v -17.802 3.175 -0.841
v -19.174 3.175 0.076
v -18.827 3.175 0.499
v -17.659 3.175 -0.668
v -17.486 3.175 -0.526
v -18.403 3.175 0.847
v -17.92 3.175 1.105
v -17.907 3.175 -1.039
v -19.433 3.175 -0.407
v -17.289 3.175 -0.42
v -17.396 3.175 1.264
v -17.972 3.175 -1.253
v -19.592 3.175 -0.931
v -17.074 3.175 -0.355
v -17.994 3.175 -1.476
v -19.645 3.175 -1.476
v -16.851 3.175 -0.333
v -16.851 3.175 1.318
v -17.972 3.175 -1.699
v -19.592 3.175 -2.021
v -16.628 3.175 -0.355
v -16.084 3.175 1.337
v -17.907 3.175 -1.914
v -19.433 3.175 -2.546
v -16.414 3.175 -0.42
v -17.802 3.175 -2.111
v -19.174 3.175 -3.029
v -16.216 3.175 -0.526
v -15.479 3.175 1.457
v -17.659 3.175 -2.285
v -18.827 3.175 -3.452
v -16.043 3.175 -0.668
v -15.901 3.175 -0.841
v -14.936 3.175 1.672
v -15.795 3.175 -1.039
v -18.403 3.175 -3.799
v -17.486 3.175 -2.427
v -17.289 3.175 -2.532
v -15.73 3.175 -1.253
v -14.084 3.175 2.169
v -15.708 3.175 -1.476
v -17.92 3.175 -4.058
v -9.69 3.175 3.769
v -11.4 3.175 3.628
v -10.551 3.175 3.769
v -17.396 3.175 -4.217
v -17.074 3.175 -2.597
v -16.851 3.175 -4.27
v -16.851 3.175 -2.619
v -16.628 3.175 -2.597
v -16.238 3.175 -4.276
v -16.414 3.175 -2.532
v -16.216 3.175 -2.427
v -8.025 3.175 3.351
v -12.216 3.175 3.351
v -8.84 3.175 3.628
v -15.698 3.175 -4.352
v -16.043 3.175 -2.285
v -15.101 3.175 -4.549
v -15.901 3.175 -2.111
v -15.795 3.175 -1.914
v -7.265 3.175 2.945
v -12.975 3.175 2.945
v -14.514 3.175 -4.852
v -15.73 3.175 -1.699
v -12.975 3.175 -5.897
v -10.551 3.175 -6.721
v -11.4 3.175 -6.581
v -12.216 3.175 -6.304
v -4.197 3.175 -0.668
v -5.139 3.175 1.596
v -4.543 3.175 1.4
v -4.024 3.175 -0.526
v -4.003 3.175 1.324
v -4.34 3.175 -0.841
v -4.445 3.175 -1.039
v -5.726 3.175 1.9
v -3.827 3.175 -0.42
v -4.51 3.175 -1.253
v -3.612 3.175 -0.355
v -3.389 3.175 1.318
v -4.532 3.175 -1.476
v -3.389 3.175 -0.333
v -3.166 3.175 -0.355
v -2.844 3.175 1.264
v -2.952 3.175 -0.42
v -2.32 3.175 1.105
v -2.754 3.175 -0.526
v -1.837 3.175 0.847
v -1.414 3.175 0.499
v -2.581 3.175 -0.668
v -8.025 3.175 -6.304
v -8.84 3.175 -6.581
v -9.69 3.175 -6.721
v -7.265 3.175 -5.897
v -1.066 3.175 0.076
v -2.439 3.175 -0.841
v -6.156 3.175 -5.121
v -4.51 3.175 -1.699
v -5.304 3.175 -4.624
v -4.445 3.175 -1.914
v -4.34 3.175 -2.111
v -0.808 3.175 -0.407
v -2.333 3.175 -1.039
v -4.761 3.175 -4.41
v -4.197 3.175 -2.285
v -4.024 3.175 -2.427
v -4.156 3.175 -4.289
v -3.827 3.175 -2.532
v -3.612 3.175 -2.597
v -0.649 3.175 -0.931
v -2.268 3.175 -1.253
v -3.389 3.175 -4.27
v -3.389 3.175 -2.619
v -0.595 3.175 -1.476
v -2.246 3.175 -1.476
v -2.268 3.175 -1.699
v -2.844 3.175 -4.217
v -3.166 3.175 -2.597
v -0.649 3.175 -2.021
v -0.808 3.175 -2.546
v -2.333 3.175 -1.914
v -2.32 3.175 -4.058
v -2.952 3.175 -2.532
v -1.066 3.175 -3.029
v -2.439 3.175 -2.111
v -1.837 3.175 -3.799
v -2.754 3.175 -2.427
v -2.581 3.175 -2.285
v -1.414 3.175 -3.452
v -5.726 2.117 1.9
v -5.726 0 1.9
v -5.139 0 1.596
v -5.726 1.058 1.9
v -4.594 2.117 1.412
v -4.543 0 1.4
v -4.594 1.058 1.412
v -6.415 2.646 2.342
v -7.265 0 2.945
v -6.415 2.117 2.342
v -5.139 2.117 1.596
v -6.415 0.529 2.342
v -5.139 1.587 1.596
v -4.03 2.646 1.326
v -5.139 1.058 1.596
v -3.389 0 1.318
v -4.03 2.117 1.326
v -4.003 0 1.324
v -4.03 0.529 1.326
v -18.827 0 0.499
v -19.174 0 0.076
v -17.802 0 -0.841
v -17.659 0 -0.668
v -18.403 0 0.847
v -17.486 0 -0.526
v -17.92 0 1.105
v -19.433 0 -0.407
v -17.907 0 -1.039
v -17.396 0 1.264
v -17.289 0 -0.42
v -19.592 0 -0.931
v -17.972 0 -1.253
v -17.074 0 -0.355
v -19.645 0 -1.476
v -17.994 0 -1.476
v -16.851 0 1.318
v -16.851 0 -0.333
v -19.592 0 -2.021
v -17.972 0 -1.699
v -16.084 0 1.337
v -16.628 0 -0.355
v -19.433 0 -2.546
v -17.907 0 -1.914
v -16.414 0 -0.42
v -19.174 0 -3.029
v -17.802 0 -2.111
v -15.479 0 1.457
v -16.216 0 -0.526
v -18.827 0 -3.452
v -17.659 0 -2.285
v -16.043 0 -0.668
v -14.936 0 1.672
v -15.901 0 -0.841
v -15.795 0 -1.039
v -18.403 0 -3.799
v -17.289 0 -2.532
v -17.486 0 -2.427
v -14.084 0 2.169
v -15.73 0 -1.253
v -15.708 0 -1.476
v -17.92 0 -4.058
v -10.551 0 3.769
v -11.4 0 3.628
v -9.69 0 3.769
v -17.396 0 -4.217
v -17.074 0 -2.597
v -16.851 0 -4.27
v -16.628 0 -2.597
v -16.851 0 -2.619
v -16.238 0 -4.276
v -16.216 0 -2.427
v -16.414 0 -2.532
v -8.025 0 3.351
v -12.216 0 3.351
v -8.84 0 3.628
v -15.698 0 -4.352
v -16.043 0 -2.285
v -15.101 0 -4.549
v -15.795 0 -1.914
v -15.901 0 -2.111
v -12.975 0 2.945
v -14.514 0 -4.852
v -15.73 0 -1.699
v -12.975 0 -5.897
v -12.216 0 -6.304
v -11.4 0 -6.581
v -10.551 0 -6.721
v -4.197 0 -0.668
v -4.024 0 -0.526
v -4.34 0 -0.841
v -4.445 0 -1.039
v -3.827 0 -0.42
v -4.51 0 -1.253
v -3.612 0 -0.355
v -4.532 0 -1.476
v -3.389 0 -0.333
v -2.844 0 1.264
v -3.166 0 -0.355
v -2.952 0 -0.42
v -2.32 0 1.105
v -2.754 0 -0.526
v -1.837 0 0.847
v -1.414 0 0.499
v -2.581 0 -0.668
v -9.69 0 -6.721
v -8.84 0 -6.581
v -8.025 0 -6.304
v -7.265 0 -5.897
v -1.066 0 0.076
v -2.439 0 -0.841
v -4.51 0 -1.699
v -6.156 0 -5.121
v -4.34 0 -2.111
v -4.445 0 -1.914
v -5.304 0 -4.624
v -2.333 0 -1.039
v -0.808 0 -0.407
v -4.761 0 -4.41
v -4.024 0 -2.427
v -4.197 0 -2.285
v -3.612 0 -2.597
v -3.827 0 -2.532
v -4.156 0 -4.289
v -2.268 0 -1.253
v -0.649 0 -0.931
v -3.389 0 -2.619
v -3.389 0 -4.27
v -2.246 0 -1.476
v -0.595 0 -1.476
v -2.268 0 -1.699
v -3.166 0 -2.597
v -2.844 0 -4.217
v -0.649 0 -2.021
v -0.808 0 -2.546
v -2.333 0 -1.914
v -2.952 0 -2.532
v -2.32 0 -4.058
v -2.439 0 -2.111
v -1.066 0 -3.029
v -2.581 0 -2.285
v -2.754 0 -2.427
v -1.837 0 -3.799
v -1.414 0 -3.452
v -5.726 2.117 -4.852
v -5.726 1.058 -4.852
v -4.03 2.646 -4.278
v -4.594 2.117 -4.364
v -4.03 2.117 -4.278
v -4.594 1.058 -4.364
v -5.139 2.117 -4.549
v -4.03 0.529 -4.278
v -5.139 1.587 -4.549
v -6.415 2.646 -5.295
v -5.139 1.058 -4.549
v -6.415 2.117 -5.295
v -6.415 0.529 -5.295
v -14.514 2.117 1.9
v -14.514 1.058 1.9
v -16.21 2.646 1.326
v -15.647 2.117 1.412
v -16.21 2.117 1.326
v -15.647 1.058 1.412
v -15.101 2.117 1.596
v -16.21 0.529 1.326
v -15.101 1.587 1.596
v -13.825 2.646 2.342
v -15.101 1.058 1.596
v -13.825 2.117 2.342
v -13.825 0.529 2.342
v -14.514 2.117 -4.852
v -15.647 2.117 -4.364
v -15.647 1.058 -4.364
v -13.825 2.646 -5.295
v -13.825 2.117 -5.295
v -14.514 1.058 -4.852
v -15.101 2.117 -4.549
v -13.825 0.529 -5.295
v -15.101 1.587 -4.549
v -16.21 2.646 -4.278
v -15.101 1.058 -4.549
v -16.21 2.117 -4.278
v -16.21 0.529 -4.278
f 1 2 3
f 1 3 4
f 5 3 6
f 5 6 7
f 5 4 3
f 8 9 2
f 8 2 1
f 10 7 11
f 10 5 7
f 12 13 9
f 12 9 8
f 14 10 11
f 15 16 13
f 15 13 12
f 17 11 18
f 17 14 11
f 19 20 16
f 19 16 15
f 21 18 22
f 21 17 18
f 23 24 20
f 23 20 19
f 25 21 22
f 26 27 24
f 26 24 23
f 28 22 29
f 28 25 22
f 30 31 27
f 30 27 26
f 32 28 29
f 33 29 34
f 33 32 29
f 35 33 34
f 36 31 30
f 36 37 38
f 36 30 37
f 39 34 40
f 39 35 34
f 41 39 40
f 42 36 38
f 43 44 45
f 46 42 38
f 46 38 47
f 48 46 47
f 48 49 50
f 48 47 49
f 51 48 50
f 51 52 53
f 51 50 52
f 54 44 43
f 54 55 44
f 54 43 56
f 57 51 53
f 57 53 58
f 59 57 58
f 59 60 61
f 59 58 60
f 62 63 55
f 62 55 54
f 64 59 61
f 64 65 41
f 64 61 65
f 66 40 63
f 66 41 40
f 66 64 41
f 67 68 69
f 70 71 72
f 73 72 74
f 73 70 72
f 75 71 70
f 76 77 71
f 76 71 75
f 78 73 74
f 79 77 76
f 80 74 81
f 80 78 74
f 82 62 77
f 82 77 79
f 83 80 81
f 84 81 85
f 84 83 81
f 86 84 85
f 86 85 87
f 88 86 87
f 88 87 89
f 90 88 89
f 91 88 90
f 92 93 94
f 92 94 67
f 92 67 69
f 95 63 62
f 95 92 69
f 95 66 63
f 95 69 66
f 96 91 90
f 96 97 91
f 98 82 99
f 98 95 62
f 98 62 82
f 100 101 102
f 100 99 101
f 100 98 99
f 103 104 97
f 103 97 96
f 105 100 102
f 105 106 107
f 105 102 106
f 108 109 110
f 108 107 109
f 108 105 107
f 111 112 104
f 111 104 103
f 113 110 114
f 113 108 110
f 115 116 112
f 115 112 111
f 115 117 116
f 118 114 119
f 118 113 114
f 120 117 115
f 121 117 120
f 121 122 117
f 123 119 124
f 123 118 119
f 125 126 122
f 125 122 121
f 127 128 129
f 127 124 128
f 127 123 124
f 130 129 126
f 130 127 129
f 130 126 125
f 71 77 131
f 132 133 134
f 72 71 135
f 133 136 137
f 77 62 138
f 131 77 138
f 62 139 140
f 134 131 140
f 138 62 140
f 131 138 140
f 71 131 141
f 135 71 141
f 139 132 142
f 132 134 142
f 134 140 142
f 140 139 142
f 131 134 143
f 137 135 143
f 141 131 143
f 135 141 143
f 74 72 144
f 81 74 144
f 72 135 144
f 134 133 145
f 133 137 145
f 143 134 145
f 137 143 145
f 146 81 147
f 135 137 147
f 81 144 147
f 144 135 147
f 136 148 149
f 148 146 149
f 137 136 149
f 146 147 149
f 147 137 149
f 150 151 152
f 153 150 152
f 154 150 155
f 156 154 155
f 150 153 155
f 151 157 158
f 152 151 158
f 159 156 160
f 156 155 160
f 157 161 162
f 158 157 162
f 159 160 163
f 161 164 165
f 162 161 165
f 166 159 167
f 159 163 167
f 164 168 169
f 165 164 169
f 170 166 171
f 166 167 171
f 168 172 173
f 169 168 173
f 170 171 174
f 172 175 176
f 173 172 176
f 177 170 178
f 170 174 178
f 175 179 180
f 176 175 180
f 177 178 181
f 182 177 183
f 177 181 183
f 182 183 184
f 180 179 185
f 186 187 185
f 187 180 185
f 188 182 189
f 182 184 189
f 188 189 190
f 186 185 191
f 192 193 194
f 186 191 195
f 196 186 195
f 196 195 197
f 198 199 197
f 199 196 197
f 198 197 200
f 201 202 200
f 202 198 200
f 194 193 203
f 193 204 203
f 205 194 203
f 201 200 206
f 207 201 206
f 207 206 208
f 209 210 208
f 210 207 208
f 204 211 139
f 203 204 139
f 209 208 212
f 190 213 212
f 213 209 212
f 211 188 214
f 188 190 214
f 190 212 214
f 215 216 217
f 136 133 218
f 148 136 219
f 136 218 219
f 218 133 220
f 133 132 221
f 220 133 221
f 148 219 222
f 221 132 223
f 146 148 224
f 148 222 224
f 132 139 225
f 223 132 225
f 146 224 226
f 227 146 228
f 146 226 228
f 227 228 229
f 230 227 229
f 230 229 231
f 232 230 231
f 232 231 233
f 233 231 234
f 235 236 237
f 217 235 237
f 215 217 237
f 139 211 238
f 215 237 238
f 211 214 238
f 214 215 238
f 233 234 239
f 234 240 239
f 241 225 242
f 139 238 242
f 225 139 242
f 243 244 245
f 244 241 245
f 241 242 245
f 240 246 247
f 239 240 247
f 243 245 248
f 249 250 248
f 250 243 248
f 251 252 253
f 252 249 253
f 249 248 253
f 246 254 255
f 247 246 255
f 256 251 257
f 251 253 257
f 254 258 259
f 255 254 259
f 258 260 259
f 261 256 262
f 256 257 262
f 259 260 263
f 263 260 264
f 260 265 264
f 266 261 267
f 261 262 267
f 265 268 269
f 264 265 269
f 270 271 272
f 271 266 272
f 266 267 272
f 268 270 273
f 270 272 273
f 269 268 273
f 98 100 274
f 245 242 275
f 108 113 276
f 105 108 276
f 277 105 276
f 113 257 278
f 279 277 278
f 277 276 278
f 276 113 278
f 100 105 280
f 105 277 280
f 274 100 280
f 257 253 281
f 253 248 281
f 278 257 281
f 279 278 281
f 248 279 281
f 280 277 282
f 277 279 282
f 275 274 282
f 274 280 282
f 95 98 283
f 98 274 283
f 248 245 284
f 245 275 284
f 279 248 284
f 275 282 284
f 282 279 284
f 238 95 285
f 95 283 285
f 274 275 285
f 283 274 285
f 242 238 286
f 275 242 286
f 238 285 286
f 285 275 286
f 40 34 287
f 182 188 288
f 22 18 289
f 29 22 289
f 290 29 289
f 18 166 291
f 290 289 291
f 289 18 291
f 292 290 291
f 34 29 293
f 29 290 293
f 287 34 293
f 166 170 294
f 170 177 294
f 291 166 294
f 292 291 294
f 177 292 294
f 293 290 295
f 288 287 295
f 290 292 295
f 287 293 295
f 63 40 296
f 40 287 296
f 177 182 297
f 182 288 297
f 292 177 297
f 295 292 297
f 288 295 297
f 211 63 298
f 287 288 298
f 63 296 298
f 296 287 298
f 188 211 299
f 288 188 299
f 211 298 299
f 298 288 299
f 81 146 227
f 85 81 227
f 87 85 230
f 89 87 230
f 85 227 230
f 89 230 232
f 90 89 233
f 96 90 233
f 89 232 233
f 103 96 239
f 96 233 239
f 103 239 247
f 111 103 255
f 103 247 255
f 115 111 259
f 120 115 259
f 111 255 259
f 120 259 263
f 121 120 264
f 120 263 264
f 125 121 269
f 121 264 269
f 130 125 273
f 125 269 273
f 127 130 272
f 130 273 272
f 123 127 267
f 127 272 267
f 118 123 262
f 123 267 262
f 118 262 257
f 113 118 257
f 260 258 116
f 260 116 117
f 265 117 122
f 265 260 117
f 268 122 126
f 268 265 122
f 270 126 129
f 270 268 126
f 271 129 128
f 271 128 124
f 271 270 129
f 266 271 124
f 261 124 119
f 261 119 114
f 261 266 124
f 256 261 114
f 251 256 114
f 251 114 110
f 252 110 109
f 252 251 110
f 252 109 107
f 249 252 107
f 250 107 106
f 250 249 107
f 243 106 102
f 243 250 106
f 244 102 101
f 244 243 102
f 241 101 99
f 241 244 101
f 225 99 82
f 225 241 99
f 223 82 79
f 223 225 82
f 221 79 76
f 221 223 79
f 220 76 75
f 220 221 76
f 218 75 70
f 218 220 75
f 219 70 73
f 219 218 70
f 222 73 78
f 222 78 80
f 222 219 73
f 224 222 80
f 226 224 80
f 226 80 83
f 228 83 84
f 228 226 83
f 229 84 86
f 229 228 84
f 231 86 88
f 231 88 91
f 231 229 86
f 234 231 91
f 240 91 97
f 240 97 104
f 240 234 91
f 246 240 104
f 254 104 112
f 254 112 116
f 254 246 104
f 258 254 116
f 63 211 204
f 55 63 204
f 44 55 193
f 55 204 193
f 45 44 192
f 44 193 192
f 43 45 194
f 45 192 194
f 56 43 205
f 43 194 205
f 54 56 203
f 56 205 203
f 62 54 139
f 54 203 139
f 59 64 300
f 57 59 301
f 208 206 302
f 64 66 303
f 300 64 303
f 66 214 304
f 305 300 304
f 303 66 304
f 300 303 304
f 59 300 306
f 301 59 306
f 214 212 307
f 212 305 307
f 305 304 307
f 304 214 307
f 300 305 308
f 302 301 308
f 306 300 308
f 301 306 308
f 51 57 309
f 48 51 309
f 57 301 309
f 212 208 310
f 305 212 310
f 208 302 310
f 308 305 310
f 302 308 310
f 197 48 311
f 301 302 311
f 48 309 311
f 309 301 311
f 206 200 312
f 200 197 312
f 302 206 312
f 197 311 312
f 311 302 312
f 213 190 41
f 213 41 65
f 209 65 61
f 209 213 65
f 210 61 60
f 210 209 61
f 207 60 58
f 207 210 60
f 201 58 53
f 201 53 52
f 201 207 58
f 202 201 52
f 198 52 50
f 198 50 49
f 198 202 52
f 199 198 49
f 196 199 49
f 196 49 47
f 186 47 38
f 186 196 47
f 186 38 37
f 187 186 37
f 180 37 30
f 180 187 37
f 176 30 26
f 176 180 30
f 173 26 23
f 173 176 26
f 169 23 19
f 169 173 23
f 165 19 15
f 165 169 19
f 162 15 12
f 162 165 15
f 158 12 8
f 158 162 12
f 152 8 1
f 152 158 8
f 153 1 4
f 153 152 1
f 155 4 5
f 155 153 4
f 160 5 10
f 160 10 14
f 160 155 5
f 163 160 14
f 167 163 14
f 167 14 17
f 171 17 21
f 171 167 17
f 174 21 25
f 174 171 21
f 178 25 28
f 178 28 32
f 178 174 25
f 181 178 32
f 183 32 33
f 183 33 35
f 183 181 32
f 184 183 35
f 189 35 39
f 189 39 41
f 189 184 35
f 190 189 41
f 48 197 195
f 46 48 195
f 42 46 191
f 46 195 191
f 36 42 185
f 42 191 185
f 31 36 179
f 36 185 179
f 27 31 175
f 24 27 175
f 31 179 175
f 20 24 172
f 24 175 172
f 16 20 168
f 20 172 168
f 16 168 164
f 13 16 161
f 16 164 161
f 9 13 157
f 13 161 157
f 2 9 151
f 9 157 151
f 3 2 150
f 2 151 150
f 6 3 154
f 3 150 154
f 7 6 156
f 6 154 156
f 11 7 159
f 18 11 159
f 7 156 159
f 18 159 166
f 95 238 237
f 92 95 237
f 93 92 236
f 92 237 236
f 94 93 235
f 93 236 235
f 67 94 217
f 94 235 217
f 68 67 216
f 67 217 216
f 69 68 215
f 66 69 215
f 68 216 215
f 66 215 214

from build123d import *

# Parameters (mm, degrees)
CROQUIS1_R              = 1.143
SALIENTE_EXTRUIR8_DEPTH = 3.175


with BuildPart() as part:
    # Croquis1 → Saliente-Extruir8 (new body)
    with BuildSketch(Plane(origin=(0, 0, 0), x_dir=(1, 0, 0), z_dir=(0, 1, 0))):
        with BuildLine():
            ThreePointArc((-16.851199999, 4.270284963), (-19.645199999, 1.476284963), (-16.851199999, -1.317715037))
            add(Edge.make_bspline(
                [(-16.851199999, -1.317715037), (-15.450840408, -1.268925893), (-14.877323423, -1.566939978), (-12.975113768, -2.944503837)],
                knots=[0, 0, 0, 0, 1, 1, 1, 1], degree=3))
            ThreePointArc((-12.975113768, -2.944503837), (-10.120199999, -3.786215037), (-7.265286229, -2.944503837))
            add(Edge.make_bspline(
                [(-7.265286229, -2.944503837), (-5.363076574, -1.566939978), (-4.789559589, -1.268925893), (-3.389199999, -1.317715037)],
                knots=[0.921934519, 0.921934519, 0.921934519, 0.921934519, 1.921934519, 1.921934519, 1.921934519, 1.921934519], degree=3))
            ThreePointArc((-3.389199999, -1.317715037), (-0.595199999, 1.476284963), (-3.389199999, 4.270284963))
            add(Edge.make_bspline(
                [(-3.389199999, 4.270284963), (-4.789559589, 4.221495819), (-5.363076574, 4.519509904), (-7.265286229, 5.897073763)],
                knots=[0, 0, 0, 0, 1, 1, 1, 1], degree=3))
            ThreePointArc((-7.265286229, 5.897073763), (-10.120199999, 6.738784963), (-12.975113768, 5.897073763))
            add(Edge.make_bspline(
                [(-12.975113768, 5.897073763), (-14.877323423, 4.519509904), (-15.450840408, 4.221495819), (-16.851199999, 4.270284963)],
                knots=[0.921934519, 0.921934519, 0.921934519, 0.921934519, 1.921934519, 1.921934519, 1.921934519, 1.921934519], degree=3))
        make_face()
        with Locations((-16.851199999, 1.476284963)):
            Circle(CROQUIS1_R, mode=Mode.SUBTRACT)
        with Locations((-3.389199999, 1.476284963)):
            Circle(CROQUIS1_R, mode=Mode.SUBTRACT)
    extrude(amount=SALIENTE_EXTRUIR8_DEPTH)


solid = part.part
